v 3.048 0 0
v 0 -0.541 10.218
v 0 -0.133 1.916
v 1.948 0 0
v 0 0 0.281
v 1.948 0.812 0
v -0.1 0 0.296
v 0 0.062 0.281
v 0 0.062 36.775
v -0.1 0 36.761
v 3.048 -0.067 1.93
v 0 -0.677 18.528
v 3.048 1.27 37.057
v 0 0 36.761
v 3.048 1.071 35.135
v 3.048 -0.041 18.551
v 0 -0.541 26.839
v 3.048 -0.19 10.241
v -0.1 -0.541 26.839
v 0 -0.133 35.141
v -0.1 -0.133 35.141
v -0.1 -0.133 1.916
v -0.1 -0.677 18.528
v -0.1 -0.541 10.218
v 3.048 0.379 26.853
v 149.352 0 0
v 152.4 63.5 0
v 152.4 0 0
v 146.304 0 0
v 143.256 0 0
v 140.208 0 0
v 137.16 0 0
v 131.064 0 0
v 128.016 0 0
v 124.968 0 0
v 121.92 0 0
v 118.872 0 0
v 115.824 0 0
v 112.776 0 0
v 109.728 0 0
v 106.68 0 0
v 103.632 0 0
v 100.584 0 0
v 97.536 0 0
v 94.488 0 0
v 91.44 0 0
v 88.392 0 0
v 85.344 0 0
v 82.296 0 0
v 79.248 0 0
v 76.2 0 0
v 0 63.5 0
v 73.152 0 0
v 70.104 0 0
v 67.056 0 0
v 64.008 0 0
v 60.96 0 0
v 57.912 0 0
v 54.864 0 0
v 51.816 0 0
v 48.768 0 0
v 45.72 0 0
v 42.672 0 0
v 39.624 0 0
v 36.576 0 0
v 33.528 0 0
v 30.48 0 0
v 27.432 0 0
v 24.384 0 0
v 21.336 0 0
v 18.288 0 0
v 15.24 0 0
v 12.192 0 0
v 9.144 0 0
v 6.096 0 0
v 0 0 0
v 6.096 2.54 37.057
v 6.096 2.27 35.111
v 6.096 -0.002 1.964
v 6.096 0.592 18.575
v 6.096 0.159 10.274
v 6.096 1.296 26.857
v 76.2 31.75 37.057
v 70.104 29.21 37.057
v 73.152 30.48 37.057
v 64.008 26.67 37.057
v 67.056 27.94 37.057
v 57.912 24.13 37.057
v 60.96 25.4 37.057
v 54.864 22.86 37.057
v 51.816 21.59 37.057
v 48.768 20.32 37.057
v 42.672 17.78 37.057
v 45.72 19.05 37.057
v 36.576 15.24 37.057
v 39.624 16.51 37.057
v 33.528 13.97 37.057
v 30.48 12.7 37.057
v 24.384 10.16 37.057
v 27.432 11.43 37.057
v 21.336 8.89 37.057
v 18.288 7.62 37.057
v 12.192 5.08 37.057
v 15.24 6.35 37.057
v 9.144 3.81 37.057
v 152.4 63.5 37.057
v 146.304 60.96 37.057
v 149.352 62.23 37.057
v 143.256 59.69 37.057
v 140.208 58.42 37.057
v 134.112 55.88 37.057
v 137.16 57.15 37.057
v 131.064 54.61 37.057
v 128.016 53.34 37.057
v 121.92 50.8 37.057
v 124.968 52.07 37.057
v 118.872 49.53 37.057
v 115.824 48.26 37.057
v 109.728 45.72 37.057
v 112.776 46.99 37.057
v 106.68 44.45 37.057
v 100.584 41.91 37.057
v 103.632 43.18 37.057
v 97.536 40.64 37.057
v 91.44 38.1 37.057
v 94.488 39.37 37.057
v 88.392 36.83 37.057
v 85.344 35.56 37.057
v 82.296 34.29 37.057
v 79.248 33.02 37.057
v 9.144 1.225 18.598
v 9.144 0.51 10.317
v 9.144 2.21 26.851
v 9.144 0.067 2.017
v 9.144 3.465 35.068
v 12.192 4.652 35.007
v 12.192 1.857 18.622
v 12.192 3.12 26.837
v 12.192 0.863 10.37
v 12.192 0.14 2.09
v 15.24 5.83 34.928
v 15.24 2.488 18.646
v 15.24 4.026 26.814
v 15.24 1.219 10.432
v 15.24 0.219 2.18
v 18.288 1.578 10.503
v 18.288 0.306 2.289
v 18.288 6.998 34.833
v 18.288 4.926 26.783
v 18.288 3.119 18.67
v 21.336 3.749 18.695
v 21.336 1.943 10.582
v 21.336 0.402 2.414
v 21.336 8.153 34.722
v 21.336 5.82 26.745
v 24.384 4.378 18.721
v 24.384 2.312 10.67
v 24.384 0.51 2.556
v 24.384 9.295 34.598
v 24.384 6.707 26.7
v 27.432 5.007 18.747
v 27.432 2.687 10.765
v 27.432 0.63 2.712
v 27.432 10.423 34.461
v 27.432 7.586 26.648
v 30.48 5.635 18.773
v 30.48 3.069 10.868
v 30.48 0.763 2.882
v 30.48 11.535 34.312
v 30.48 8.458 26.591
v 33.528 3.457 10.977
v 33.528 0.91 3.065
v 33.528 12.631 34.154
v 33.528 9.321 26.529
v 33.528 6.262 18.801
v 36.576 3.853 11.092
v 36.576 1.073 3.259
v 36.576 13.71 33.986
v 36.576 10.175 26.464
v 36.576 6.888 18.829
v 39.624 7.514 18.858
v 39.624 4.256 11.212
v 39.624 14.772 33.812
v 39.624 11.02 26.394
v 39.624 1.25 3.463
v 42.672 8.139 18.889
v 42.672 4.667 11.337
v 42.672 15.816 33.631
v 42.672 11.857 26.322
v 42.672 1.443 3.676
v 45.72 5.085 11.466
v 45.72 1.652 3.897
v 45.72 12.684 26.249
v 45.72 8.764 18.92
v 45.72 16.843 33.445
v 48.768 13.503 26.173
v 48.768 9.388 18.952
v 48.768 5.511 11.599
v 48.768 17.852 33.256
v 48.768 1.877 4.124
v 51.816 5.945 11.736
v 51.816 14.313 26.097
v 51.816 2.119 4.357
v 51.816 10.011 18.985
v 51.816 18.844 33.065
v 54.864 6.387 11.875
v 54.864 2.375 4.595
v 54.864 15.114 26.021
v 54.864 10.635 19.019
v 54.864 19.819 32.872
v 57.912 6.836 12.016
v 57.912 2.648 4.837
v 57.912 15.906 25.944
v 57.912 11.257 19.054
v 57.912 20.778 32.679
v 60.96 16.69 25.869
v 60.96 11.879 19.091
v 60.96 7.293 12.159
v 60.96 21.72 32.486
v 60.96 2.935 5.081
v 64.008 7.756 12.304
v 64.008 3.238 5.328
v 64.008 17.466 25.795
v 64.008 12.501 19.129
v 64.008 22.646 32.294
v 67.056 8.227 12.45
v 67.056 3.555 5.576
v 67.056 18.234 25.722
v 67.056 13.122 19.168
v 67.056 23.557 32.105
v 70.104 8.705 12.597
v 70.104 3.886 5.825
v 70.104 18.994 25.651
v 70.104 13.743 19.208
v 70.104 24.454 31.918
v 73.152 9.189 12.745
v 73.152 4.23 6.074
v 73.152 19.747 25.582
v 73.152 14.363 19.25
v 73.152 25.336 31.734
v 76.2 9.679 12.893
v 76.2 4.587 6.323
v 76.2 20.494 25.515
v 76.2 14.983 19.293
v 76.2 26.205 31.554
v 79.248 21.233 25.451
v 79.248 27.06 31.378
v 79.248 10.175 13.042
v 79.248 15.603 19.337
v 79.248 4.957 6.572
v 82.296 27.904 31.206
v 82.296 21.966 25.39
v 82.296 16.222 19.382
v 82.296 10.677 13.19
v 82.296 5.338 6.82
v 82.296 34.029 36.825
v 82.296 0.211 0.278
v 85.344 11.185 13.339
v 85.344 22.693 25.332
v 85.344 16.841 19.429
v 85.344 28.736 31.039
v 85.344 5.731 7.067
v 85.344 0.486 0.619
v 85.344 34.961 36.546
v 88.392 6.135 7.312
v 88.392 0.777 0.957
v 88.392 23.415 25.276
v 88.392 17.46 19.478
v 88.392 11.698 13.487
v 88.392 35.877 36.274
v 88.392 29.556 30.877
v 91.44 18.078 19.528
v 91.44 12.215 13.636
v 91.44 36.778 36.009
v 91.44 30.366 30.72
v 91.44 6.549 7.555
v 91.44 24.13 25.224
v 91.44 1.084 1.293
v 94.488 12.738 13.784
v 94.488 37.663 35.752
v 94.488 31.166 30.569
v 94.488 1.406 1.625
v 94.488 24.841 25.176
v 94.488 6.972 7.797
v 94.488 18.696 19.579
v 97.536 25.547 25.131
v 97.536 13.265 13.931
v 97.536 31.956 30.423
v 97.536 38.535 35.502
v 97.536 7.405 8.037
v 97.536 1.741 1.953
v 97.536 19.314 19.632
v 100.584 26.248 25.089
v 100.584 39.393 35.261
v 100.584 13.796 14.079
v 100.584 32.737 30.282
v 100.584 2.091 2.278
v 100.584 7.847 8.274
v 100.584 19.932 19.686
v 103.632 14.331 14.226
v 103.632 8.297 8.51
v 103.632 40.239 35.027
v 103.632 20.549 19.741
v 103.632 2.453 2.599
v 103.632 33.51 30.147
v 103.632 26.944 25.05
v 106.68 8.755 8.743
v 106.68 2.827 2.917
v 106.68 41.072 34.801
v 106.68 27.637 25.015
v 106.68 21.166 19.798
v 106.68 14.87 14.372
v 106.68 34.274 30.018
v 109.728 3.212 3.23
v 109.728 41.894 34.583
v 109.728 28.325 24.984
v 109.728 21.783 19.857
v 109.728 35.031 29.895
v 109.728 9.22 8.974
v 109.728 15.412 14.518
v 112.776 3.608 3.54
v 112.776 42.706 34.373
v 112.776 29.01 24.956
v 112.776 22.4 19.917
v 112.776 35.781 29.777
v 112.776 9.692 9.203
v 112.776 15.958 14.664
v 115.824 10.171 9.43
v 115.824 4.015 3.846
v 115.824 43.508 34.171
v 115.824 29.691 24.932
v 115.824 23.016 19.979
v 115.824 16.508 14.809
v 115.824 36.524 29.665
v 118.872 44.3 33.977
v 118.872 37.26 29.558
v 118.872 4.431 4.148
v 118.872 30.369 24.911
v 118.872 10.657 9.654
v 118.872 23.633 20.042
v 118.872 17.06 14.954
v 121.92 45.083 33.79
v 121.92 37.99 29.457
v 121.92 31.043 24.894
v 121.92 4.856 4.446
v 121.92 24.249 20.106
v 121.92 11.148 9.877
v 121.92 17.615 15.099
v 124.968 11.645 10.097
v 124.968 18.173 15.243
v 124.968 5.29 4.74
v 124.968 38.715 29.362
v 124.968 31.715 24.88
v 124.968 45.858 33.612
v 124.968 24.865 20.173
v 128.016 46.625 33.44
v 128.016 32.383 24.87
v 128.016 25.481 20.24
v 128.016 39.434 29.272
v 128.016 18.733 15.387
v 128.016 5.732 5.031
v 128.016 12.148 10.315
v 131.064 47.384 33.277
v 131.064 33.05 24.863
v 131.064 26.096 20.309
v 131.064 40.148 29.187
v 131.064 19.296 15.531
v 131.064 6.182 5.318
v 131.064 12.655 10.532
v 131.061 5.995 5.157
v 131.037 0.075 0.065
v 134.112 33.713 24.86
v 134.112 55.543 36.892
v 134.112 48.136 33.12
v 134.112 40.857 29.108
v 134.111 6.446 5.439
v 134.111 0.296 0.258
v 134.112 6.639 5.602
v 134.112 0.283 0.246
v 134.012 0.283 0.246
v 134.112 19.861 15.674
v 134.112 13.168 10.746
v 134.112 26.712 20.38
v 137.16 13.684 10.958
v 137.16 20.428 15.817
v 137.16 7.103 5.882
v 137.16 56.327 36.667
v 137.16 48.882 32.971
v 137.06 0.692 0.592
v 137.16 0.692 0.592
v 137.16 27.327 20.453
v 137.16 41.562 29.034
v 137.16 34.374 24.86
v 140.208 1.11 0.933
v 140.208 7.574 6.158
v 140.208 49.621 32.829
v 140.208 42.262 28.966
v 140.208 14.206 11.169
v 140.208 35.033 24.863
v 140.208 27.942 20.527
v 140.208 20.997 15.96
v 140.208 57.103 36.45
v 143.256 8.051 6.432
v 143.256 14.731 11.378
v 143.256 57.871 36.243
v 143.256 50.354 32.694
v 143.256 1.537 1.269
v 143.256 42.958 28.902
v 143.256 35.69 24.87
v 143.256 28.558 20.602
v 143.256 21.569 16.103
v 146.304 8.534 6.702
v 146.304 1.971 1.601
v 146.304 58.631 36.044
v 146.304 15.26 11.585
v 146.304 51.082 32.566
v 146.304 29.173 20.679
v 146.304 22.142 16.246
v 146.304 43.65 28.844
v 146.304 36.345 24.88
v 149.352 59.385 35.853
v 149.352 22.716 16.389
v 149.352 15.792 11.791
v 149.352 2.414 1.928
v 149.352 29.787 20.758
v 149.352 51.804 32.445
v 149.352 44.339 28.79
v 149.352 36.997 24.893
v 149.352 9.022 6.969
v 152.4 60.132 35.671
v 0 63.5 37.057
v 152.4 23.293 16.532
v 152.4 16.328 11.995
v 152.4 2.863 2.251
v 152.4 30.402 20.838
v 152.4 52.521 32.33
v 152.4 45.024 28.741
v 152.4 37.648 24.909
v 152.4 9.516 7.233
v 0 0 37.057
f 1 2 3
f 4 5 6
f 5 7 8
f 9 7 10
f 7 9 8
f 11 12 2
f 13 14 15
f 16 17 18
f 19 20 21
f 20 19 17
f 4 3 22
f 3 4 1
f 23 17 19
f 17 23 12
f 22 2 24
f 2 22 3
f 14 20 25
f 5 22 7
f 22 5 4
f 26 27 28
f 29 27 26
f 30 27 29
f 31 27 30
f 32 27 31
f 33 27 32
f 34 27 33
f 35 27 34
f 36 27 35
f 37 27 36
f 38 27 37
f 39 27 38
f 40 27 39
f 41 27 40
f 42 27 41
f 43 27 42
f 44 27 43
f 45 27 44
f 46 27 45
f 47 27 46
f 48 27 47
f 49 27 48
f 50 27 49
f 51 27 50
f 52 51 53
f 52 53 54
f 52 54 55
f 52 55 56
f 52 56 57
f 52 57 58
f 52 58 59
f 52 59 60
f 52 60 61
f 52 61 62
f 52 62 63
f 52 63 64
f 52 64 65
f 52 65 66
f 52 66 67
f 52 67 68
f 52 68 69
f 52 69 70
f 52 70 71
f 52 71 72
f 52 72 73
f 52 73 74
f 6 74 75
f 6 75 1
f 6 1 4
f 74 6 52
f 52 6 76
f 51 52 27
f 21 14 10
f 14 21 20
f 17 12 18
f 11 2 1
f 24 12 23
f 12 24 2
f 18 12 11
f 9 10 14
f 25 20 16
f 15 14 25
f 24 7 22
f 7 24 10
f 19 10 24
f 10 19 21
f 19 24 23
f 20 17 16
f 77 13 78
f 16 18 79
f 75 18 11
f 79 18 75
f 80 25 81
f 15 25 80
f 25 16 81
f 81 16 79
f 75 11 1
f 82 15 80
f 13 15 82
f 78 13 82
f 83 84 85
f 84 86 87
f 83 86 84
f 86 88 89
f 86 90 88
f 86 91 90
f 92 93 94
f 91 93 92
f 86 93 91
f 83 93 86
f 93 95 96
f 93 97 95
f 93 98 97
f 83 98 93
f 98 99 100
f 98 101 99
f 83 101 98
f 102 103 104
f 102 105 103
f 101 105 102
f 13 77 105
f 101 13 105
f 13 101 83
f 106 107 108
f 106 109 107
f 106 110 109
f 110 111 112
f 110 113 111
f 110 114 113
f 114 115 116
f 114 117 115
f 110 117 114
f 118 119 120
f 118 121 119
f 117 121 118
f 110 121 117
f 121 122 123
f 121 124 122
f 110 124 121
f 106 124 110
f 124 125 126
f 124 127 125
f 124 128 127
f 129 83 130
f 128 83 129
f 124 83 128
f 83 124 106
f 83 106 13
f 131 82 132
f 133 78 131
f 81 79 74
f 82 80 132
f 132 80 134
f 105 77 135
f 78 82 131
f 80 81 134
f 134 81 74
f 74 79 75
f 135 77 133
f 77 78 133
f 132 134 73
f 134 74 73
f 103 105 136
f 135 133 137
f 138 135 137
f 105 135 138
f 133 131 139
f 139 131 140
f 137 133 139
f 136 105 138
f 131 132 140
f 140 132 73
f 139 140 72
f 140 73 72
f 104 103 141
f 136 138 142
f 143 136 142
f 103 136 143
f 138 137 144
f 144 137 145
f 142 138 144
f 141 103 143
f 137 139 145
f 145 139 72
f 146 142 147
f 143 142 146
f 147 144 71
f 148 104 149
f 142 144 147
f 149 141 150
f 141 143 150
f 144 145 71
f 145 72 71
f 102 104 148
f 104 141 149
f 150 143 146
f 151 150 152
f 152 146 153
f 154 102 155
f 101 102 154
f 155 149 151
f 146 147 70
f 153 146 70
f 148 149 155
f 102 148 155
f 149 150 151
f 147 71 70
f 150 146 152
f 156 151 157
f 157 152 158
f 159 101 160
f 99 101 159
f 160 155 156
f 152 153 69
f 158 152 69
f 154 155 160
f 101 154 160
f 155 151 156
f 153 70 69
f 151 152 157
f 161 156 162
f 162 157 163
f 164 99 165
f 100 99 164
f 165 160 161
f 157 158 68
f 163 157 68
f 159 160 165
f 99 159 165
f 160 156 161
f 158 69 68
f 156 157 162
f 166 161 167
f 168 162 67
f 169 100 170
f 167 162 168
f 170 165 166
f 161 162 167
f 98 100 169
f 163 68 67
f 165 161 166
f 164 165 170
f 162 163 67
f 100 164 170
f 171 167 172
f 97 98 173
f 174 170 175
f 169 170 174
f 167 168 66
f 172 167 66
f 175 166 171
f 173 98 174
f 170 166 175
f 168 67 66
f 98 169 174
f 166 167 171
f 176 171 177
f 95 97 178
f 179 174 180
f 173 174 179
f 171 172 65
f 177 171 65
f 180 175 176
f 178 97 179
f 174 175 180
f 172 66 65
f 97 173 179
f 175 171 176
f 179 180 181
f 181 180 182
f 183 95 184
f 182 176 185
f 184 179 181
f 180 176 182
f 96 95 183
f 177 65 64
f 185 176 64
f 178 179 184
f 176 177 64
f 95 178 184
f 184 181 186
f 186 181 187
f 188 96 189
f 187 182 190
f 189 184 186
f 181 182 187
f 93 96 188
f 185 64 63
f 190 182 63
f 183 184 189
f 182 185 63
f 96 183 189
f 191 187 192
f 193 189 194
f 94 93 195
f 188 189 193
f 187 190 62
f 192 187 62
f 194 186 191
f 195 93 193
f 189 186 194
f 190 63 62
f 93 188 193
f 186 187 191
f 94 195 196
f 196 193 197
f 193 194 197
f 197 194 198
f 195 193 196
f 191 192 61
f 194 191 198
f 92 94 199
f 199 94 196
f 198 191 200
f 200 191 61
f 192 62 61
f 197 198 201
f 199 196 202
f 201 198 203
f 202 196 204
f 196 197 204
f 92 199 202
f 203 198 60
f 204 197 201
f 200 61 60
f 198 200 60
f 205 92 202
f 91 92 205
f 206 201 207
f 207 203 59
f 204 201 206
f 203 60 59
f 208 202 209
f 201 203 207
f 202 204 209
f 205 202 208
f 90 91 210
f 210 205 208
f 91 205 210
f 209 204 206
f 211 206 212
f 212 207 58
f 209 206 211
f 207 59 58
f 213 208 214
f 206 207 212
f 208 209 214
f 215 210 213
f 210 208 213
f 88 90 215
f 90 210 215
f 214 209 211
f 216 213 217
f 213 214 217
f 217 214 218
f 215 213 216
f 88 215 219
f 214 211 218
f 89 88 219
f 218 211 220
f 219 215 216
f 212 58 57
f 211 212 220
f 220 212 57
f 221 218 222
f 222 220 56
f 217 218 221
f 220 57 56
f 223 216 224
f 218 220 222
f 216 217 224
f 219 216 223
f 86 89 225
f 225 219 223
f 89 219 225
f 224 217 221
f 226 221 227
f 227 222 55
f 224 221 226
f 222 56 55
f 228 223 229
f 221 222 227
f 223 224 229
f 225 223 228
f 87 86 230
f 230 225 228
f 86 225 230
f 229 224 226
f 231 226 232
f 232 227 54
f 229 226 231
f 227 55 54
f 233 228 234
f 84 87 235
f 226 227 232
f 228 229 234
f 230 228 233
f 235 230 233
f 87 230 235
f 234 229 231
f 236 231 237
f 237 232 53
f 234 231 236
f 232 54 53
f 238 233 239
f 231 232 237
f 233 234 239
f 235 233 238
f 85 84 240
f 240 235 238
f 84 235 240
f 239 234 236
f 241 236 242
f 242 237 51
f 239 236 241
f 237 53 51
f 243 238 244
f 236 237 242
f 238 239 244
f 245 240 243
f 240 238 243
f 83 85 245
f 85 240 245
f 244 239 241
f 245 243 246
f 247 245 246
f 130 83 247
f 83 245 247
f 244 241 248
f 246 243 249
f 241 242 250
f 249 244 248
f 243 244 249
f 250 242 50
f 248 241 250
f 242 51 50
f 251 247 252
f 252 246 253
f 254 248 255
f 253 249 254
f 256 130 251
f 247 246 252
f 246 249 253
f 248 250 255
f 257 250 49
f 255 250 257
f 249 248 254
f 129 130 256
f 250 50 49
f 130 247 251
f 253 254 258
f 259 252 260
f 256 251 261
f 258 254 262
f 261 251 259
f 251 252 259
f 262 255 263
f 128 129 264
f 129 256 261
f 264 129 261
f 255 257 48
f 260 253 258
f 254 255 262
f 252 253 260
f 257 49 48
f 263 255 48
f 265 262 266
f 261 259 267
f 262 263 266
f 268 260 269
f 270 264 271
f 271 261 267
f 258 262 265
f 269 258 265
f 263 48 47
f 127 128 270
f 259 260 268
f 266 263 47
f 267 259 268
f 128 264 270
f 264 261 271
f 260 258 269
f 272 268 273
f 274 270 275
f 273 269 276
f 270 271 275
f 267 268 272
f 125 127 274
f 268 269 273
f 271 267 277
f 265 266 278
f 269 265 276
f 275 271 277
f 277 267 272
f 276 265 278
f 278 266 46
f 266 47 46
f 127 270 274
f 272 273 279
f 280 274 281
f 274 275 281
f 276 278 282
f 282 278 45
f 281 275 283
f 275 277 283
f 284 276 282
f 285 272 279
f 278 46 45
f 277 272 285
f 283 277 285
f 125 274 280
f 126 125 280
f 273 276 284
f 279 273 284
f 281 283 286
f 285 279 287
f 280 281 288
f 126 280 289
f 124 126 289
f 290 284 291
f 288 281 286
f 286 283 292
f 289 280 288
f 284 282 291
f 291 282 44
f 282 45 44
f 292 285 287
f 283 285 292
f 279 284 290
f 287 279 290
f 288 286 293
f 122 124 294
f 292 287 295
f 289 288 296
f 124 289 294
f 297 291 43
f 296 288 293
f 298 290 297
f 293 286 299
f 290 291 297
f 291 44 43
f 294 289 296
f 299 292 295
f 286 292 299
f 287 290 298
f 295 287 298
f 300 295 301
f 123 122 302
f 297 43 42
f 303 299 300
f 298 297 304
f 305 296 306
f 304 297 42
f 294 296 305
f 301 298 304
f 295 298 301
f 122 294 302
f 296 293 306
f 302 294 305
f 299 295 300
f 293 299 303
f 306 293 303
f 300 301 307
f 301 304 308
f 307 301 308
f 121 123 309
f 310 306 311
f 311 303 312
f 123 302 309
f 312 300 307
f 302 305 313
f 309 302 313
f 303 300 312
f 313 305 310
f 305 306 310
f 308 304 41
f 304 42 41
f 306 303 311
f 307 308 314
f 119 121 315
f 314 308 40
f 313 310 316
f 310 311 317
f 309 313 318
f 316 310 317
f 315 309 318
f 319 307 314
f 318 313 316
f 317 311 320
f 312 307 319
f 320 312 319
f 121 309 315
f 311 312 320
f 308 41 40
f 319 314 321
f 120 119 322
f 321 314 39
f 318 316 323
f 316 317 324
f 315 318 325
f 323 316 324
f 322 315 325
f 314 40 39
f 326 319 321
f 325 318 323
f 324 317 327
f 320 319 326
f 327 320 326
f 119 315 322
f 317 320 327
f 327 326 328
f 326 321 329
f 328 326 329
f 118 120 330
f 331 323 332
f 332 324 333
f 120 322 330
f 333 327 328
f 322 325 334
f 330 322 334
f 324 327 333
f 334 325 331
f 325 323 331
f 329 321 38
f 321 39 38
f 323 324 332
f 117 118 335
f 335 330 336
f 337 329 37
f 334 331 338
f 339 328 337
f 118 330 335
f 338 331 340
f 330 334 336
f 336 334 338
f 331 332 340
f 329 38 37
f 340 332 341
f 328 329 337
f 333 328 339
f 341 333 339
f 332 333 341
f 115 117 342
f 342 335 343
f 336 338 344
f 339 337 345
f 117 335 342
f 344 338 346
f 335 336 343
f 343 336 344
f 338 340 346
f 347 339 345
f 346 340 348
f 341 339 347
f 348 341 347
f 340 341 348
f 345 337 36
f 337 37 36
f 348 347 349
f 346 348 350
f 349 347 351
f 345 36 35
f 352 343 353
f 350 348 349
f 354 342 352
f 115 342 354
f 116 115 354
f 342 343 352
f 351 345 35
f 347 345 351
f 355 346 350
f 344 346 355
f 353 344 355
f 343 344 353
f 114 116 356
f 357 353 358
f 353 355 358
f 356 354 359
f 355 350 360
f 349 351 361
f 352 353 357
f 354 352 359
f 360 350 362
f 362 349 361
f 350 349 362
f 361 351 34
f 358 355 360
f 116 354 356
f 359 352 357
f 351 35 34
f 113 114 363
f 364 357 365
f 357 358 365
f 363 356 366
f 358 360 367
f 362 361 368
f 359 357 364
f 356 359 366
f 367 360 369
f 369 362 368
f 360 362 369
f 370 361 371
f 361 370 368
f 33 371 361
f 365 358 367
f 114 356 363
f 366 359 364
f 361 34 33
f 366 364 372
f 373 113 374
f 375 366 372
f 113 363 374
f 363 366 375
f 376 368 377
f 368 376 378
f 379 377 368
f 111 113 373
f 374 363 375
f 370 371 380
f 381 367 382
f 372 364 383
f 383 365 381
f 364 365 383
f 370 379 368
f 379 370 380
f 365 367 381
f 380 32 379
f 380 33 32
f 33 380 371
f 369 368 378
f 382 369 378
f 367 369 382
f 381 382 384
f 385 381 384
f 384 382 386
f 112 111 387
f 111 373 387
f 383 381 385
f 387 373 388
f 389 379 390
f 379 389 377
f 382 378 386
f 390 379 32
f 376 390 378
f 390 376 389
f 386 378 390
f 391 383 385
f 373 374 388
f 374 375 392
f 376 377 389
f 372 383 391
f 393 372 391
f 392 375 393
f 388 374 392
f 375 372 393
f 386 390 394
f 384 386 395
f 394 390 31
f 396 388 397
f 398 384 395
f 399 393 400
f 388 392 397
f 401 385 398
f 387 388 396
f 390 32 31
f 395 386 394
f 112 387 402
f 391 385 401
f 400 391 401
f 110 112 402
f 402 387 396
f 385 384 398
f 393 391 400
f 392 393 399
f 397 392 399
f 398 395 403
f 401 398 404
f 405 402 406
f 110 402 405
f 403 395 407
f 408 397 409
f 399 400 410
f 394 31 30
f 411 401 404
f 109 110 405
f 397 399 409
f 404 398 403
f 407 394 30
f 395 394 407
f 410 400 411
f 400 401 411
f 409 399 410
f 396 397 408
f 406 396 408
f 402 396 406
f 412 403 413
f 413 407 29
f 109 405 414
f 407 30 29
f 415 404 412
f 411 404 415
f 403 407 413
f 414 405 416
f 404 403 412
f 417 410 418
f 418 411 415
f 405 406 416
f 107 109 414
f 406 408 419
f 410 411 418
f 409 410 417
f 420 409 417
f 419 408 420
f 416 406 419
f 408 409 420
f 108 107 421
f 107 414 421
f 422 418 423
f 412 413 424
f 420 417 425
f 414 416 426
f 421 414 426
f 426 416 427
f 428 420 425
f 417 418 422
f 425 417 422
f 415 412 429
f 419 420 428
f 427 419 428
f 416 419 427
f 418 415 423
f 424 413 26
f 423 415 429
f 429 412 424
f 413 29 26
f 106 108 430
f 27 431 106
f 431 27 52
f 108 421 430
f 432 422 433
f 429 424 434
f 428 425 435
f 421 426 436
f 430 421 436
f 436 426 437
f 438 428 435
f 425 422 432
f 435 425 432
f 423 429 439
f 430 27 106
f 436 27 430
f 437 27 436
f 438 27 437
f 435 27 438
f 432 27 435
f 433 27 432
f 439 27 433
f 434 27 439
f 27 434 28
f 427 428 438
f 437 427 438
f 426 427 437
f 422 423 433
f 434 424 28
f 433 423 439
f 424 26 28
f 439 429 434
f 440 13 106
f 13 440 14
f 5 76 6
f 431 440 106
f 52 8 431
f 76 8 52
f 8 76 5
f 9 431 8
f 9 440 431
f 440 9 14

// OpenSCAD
 
/* [Dimensions] */
// Prop hub to tip along the x-axis
prop_dia_in = 12.0;

// Theoretical distance traved in one revelution
prop_pitch_in = 22.0;

// Width of rectangular block
block_width_in = 2.5;

/* [Options] */ 
// Cross Sections
xsection="curved";  // [curved:Circular,flat:Flat]

// Radius of curcved cross section
camber_radius_in = 10.0;

// Divisions between root and tip
sections = 50;
 
/* [Hidden] */
mm = 25.4;
$fn = 192;

prop_dia = prop_dia_in * mm;
prop_pitch = prop_pitch_in * mm;
block_width = block_width_in *mm;
camber_radius = camber_radius_in * mm;

// https://indoornewsandviews.files.wordpress.com/2012/10/inav_121_press.pdf
// From page 22, Indoor Props - Practice
function t_block(d, p, w) = p*w/(3.14159*d);

// Determine the height of an enclosing block given the above formula 
block_height =  t_block(prop_dia, prop_pitch, block_width);

// Fill in the basic block shape
linear_extrude(block_height) polygon([[0,0],[prop_dia/2, block_width], [0, block_width]]);

// Iterate over the blade cross sections
for(i=[0:sections-1]) {
    hull() {
        blade_section(i, block_width, block_height, sections, camber_radius, xsection);
        blade_section(i+1, block_width, block_height, sections, camber_radius, xsection);
    }
}


module circular_segment(R, c)
{
    // see https://en.wikipedia.org/wiki/Circular_segment
    d = sqrt(R*R-(c*c)/4);
    linear_extrude(0.1) difference() {
        translate([-d,0,0]) circle(R);
        translate([-R,0,0]) square(2*R, center=true);
    }
}


 module blade_section(i, width, height, sections, camber_rad=125, xsection)
 {
    width_i = i*width/sections;
    chord_i = sqrt(height*height+width_i*width_i);
    angle_i = atan(width_i / height);

    translate([(i/sections)*prop_dia/2,0,0]) {
        // generate and orient the circular segments
        if (xsection == "curved") {
            rotate([-angle_i,0,0]) 
                translate([0, 0, chord_i/2]) 
                    rotate([90, 0, -90]) circular_segment(camber_rad, chord_i);
        }
        // generate trianble to 'support' the circular segments
        rotate([0,-90,0]) linear_extrude(1.1) 
            polygon([[0,0], [0, width_i], [height, width_i]]);
    }      
}
